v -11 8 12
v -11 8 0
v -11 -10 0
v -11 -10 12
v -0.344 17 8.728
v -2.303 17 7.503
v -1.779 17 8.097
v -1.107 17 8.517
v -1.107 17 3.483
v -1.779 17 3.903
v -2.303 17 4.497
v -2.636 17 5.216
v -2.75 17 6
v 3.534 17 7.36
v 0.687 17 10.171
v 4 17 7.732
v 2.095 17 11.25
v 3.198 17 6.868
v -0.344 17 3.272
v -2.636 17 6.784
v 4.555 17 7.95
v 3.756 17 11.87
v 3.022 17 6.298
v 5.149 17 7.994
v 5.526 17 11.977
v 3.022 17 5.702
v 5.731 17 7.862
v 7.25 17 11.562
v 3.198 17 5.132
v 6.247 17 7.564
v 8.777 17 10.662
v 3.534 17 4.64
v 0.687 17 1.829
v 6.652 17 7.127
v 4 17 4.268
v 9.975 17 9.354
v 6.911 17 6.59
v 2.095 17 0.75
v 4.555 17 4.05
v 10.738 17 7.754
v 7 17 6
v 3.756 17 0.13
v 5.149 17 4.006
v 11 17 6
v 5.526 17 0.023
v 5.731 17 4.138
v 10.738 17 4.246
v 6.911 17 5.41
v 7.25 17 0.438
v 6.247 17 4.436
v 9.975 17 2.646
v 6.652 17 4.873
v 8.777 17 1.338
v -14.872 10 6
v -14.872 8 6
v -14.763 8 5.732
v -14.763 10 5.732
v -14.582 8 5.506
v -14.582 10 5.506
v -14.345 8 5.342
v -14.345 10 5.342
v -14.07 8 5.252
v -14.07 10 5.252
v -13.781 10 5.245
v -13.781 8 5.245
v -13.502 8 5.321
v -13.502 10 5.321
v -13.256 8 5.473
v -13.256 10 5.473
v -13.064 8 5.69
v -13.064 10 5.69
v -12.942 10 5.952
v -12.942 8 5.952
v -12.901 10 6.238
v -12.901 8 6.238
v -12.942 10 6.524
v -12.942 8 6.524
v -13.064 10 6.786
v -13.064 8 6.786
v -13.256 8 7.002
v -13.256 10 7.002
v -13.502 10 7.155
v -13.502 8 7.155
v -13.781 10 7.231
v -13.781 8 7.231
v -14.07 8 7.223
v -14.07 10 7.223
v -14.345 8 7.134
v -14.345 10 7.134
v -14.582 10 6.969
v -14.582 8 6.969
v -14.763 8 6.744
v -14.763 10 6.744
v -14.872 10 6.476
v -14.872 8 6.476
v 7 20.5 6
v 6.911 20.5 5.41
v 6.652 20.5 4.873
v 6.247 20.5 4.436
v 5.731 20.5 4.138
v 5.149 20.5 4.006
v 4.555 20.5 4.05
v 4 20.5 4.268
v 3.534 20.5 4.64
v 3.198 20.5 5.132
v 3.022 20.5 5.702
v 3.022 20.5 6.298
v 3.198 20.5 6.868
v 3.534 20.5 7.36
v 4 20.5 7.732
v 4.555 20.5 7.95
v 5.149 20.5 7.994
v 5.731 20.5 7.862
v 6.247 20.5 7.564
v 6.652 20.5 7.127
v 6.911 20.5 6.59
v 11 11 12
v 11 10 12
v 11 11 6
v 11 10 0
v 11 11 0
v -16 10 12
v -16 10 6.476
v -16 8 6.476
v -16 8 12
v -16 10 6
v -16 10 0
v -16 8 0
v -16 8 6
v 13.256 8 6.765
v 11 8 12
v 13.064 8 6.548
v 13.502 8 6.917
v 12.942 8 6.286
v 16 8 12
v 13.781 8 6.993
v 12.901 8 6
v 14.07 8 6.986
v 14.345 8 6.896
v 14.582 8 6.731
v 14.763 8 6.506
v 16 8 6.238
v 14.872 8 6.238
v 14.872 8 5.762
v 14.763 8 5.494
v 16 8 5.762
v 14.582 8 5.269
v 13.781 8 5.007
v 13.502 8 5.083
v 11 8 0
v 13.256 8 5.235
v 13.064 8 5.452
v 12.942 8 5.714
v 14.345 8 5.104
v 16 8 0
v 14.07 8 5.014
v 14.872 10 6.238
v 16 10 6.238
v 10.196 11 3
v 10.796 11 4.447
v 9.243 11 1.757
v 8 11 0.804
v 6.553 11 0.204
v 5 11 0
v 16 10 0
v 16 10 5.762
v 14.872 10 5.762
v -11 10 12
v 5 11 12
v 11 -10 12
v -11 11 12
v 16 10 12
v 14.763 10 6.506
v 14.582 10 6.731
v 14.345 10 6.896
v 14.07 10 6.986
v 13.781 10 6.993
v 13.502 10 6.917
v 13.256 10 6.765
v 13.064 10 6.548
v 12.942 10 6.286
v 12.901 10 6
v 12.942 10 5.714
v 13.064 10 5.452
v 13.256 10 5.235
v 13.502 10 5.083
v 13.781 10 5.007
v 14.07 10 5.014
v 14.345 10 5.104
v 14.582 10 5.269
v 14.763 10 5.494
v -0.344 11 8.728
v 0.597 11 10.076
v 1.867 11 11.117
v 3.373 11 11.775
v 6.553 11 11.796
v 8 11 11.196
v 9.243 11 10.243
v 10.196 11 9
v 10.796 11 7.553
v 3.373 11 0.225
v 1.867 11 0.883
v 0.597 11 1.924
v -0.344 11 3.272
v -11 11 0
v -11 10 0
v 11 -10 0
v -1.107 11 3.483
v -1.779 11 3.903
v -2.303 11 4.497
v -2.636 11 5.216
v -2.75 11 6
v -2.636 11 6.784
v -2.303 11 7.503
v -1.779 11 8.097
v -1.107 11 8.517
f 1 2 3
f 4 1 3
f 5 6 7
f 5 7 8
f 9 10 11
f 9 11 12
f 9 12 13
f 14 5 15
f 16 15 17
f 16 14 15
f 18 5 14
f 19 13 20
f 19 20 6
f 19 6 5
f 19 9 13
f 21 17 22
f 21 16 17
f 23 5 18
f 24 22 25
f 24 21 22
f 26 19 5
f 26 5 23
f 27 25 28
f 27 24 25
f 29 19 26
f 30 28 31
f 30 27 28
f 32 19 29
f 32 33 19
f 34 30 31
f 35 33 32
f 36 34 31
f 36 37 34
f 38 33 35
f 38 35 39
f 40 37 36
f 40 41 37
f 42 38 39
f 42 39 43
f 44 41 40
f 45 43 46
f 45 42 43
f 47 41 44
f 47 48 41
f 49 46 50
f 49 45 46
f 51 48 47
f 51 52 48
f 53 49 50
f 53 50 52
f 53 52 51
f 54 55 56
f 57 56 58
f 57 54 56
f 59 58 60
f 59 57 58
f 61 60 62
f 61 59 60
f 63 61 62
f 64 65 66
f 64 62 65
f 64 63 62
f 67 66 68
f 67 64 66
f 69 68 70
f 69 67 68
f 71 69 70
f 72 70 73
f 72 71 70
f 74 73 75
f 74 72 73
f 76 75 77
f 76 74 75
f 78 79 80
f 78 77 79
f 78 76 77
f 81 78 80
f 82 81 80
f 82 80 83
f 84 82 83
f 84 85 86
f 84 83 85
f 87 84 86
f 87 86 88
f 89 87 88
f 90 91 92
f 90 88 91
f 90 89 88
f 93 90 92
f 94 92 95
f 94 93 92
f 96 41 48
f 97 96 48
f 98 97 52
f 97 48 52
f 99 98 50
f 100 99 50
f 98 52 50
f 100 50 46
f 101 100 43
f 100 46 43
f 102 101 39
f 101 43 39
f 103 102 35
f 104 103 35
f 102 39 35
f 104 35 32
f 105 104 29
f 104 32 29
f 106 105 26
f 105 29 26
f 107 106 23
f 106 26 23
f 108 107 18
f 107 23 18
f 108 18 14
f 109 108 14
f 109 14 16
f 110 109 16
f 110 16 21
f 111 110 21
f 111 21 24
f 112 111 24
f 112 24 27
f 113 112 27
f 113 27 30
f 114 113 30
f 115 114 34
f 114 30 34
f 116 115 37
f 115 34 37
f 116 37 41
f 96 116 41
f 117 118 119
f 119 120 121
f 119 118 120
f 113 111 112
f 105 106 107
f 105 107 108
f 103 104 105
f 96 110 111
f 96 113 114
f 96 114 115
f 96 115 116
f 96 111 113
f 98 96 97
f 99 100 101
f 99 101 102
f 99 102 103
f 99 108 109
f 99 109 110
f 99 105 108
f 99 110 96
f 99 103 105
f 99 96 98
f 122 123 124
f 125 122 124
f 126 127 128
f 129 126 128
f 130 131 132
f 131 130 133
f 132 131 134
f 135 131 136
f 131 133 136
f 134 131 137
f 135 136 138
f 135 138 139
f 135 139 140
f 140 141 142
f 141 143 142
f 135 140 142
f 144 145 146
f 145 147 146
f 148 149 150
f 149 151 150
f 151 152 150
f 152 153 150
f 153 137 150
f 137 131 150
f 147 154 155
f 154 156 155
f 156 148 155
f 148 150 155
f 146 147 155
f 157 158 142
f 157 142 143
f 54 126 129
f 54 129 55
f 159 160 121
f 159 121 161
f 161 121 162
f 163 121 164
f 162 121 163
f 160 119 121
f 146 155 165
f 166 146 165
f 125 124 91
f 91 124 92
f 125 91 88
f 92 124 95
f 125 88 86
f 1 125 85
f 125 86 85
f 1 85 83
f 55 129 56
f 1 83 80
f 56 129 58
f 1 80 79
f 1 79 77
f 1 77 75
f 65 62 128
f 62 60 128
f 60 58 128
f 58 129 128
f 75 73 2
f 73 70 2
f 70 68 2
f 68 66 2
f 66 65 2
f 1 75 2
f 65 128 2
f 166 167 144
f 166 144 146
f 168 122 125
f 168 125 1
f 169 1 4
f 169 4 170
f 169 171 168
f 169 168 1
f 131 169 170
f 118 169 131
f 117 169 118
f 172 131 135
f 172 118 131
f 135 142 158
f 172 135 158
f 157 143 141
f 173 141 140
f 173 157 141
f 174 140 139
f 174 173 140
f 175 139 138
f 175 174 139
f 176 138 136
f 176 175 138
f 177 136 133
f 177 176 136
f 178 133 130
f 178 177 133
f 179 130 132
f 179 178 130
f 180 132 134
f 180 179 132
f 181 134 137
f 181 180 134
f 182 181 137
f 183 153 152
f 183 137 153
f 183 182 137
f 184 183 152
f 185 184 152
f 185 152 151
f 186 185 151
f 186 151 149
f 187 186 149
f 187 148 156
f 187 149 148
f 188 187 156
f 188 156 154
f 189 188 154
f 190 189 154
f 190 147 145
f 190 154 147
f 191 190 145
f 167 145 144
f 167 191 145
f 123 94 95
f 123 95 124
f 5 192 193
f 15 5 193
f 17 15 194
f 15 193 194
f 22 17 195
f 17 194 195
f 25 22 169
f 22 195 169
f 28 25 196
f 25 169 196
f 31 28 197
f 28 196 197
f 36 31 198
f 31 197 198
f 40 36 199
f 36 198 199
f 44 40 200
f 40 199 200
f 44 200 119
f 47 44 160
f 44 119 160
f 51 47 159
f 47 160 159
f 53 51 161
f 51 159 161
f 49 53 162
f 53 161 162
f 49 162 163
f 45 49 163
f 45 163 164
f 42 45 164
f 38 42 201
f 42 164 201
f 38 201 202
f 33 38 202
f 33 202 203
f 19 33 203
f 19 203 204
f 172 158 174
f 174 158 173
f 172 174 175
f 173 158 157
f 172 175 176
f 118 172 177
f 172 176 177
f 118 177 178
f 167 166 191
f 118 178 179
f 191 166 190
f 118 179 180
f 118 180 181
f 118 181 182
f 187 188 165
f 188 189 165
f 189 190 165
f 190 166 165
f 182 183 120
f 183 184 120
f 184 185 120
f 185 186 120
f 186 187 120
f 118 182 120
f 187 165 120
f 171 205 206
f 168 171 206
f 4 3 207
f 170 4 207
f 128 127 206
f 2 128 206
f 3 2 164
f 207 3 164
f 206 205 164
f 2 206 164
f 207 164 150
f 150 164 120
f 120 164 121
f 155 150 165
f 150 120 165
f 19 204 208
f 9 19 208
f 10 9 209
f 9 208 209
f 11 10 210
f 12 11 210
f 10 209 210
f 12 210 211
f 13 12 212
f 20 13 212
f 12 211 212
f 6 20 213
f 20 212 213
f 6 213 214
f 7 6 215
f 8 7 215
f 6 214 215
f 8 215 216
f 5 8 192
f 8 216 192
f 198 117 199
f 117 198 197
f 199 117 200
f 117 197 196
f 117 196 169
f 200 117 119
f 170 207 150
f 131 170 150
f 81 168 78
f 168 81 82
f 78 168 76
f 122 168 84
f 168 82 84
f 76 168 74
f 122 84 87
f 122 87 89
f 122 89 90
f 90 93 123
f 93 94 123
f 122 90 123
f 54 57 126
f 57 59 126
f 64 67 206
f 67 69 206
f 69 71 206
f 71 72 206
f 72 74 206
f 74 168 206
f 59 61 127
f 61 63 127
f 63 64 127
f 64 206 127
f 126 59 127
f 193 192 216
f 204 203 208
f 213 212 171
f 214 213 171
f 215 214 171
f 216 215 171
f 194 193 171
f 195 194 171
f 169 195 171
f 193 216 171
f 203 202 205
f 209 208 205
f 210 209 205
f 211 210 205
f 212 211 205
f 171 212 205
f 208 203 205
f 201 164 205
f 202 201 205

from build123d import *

# Parameters (mm, degrees)
BOSS_EXTRUDE1_DEPTH = 12
CUT_EXTRUDE1_REACH  = 22
BOSS_EXTRUDE2_DEPTH = 6
SKETCH4_R           = 2
BOSS_EXTRUDE3_DEPTH = 3.5


with BuildPart() as part:
    # Sketch1 → Boss-Extrude1 (new body)
    with BuildSketch(Plane.XY):
        Polygon((-16, 10), (-16, 8), (-11, 8), (-11, -10), (11, -10), (11, 8), (16, 8), (16, 10), (11, 10), (11, 11), (-11, 11), (-11, 10), align=None)
    extrude(amount=BOSS_EXTRUDE1_DEPTH)

    # Sketch2 → Cut-Extrude1 (cut, up to next)
    with BuildSketch(Plane(origin=(0, 10, 0), x_dir=(1, 0, 0), z_dir=(0, 1, 0)), mode=Mode.PRIVATE) as cut_extrude1_sk1:
        with BuildLine():
            Line((-16, -6), (-14.871798323, -6))
            ThreePointArc((-14.871798323, -6), (-12.900501279, -6.237869823), (-14.871798323, -6.475739646))
            Line((-14.871798323, -6.475739646), (-16, -6.475739646))
            Line((-16, -6.475739646), (-16, -6))
        make_face()
    cut_extrude1_tool1 = extrude(cut_extrude1_sk1.sketch, amount=-CUT_EXTRUDE1_REACH, mode=Mode.PRIVATE) & part.part
    add(cut_extrude1_tool1.solids().sort_by_distance((-14.122654, 10, 6.23787))[0], mode=Mode.SUBTRACT)
    # Sketch2 → Cut-Extrude1 (cut, up to next)
    with BuildSketch(Plane(origin=(0, 10, 0), x_dir=(1, 0, 0), z_dir=(0, 1, 0)), mode=Mode.PRIVATE) as cut_extrude1_sk2:
        with BuildLine():
            Line((16, -6.237869823), (14.871798323, -6.237869823))
            ThreePointArc((14.871798323, -6.237869823), (12.900501279, -6), (14.871798323, -5.762130177))
            Line((14.871798323, -5.762130177), (16, -5.762130177))
            Line((16, -5.762130177), (16, -6.237869823))
        make_face()
    cut_extrude1_tool2 = extrude(cut_extrude1_sk2.sketch, amount=-CUT_EXTRUDE1_REACH, mode=Mode.PRIVATE) & part.part
    add(cut_extrude1_tool2.solids().sort_by_distance((14.122654, 10, 6))[0], mode=Mode.SUBTRACT)

    # Sketch3 → Boss-Extrude2 (add)
    with BuildSketch(Plane(origin=(0, 11, 0), x_dir=(1, 0, 0), z_dir=(0, 1, 0))):
        with BuildLine():
            ThreePointArc((-0.34375, -8.72843104), (11, -6), (-0.34375, -3.27156896))
            ThreePointArc((-0.34375, -3.27156896), (-2.75, -6), (-0.34375, -8.72843104))
        make_face()
    extrude(amount=BOSS_EXTRUDE2_DEPTH)

    # Sketch4 → Boss-Extrude3 (add)
    with BuildSketch(Plane(origin=(0, 17, 0), x_dir=(1, 0, 0), z_dir=(0, 1, 0))):
        with Locations((5, -6)):
            Circle(SKETCH4_R)
    extrude(amount=BOSS_EXTRUDE3_DEPTH)


solid = part.part
